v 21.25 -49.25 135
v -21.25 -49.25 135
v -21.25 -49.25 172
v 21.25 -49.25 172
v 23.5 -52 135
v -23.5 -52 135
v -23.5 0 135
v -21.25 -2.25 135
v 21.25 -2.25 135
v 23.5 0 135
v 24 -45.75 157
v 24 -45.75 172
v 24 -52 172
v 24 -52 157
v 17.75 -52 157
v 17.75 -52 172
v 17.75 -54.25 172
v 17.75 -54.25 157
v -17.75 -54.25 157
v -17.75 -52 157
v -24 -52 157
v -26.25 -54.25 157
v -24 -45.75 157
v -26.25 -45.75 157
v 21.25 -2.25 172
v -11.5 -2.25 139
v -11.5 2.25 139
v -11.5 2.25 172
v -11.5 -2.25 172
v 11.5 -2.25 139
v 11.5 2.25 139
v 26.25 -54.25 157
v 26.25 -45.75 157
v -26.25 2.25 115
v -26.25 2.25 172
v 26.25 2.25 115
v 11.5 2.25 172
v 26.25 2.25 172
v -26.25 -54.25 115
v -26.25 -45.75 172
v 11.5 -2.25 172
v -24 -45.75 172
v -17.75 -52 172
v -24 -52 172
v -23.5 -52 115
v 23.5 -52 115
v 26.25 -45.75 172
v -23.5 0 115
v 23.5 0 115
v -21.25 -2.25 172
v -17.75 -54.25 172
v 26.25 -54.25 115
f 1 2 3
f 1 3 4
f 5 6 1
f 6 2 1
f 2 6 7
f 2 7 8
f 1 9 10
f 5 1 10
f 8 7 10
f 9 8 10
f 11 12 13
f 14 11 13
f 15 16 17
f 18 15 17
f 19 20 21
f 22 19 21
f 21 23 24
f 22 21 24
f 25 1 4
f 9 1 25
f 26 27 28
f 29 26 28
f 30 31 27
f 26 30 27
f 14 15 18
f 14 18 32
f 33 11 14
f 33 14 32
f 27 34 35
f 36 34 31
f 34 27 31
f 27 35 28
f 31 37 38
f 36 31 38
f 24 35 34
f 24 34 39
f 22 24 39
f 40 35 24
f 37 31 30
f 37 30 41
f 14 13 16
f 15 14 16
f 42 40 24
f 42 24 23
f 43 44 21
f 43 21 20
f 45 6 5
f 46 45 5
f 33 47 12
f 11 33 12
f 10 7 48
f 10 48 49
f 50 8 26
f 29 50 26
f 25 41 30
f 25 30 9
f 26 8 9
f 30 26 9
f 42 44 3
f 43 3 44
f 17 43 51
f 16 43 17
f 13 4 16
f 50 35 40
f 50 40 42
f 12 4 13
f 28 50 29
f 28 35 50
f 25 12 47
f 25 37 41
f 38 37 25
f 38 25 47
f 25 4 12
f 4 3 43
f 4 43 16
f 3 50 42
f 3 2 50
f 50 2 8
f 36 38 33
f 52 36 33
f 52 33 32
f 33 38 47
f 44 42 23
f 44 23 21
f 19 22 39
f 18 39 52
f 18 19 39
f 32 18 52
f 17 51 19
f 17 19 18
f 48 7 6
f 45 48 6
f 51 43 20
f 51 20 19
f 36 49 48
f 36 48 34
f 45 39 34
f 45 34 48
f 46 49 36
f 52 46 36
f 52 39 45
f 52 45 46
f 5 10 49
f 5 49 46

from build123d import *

# Parameters (mm, degrees)
SKETCH112_W     = 52.5
SKETCH112_H     = 56.5
SKETCH112_W_2   = 42.5
SKETCH112_H_2   = 47
PAD058_DEPTH    = 37
SKETCH113_W     = 23
SKETCH113_H     = 33
POCKET050_DEPTH = 5
SKETCH114_W     = 52.5
SKETCH114_H     = 56.5
SKETCH114_W_2   = 47
SKETCH114_H_2   = 52
PAD059_DEPTH    = 20
POCKET060_DEPTH = 15


with BuildPart() as part:
    # Sketch112 → Pad058 (new body)
    with BuildSketch(Plane.XY):
        with Locations((0, -26)):
            Rectangle(SKETCH112_W, SKETCH112_H)
        with Locations((0, -25.75)):
            Rectangle(SKETCH112_W_2, SKETCH112_H_2, mode=Mode.SUBTRACT)
    extrude(amount=PAD058_DEPTH)

    # Sketch113 (on Face1 of Pad058) → Pocket050 (cut)
    with BuildSketch(Plane(origin=(0, 2.25, 0), x_dir=(-1, 0, 0), z_dir=(0, 1, 0))):
        with Locations((0, 20.5)):
            Rectangle(SKETCH113_W, SKETCH113_H)
    extrude(amount=-POCKET050_DEPTH, mode=Mode.SUBTRACT)

    # Sketch114 (on Face2 of Pocket050) → Pad059 (join)
    with BuildSketch(Plane(origin=(0, 0, 0), x_dir=(1, 0, 0), z_dir=(0, 0, -1))):
        with Locations((0, 26)):
            Rectangle(SKETCH114_W, SKETCH114_H)
        with Locations((0, 26)):
            Rectangle(SKETCH114_W_2, SKETCH114_H_2, mode=Mode.SUBTRACT)
    extrude(amount=PAD059_DEPTH)

    # Sketch136 (on Face1 of Pad059) → Pocket060 (cut)
    with BuildSketch(Plane.XY.offset(37)):
        Polygon((-26.25, -54.25), (-26.25, -45.75), (-24, -45.75), (-24, -52), (-17.75, -52), (-17.75, -54.25), align=None)
        Polygon((26.25, -54.25), (26.25, -45.75), (24, -45.75), (24, -52), (17.75, -52), (17.75, -54.25), align=None)
    extrude(amount=-POCKET060_DEPTH, mode=Mode.SUBTRACT)


with BuildPart() as part_1:
    # Body032 placement: moved
    add(part.part.moved(Location((0, 0, 135))))


solid = part_1.part
